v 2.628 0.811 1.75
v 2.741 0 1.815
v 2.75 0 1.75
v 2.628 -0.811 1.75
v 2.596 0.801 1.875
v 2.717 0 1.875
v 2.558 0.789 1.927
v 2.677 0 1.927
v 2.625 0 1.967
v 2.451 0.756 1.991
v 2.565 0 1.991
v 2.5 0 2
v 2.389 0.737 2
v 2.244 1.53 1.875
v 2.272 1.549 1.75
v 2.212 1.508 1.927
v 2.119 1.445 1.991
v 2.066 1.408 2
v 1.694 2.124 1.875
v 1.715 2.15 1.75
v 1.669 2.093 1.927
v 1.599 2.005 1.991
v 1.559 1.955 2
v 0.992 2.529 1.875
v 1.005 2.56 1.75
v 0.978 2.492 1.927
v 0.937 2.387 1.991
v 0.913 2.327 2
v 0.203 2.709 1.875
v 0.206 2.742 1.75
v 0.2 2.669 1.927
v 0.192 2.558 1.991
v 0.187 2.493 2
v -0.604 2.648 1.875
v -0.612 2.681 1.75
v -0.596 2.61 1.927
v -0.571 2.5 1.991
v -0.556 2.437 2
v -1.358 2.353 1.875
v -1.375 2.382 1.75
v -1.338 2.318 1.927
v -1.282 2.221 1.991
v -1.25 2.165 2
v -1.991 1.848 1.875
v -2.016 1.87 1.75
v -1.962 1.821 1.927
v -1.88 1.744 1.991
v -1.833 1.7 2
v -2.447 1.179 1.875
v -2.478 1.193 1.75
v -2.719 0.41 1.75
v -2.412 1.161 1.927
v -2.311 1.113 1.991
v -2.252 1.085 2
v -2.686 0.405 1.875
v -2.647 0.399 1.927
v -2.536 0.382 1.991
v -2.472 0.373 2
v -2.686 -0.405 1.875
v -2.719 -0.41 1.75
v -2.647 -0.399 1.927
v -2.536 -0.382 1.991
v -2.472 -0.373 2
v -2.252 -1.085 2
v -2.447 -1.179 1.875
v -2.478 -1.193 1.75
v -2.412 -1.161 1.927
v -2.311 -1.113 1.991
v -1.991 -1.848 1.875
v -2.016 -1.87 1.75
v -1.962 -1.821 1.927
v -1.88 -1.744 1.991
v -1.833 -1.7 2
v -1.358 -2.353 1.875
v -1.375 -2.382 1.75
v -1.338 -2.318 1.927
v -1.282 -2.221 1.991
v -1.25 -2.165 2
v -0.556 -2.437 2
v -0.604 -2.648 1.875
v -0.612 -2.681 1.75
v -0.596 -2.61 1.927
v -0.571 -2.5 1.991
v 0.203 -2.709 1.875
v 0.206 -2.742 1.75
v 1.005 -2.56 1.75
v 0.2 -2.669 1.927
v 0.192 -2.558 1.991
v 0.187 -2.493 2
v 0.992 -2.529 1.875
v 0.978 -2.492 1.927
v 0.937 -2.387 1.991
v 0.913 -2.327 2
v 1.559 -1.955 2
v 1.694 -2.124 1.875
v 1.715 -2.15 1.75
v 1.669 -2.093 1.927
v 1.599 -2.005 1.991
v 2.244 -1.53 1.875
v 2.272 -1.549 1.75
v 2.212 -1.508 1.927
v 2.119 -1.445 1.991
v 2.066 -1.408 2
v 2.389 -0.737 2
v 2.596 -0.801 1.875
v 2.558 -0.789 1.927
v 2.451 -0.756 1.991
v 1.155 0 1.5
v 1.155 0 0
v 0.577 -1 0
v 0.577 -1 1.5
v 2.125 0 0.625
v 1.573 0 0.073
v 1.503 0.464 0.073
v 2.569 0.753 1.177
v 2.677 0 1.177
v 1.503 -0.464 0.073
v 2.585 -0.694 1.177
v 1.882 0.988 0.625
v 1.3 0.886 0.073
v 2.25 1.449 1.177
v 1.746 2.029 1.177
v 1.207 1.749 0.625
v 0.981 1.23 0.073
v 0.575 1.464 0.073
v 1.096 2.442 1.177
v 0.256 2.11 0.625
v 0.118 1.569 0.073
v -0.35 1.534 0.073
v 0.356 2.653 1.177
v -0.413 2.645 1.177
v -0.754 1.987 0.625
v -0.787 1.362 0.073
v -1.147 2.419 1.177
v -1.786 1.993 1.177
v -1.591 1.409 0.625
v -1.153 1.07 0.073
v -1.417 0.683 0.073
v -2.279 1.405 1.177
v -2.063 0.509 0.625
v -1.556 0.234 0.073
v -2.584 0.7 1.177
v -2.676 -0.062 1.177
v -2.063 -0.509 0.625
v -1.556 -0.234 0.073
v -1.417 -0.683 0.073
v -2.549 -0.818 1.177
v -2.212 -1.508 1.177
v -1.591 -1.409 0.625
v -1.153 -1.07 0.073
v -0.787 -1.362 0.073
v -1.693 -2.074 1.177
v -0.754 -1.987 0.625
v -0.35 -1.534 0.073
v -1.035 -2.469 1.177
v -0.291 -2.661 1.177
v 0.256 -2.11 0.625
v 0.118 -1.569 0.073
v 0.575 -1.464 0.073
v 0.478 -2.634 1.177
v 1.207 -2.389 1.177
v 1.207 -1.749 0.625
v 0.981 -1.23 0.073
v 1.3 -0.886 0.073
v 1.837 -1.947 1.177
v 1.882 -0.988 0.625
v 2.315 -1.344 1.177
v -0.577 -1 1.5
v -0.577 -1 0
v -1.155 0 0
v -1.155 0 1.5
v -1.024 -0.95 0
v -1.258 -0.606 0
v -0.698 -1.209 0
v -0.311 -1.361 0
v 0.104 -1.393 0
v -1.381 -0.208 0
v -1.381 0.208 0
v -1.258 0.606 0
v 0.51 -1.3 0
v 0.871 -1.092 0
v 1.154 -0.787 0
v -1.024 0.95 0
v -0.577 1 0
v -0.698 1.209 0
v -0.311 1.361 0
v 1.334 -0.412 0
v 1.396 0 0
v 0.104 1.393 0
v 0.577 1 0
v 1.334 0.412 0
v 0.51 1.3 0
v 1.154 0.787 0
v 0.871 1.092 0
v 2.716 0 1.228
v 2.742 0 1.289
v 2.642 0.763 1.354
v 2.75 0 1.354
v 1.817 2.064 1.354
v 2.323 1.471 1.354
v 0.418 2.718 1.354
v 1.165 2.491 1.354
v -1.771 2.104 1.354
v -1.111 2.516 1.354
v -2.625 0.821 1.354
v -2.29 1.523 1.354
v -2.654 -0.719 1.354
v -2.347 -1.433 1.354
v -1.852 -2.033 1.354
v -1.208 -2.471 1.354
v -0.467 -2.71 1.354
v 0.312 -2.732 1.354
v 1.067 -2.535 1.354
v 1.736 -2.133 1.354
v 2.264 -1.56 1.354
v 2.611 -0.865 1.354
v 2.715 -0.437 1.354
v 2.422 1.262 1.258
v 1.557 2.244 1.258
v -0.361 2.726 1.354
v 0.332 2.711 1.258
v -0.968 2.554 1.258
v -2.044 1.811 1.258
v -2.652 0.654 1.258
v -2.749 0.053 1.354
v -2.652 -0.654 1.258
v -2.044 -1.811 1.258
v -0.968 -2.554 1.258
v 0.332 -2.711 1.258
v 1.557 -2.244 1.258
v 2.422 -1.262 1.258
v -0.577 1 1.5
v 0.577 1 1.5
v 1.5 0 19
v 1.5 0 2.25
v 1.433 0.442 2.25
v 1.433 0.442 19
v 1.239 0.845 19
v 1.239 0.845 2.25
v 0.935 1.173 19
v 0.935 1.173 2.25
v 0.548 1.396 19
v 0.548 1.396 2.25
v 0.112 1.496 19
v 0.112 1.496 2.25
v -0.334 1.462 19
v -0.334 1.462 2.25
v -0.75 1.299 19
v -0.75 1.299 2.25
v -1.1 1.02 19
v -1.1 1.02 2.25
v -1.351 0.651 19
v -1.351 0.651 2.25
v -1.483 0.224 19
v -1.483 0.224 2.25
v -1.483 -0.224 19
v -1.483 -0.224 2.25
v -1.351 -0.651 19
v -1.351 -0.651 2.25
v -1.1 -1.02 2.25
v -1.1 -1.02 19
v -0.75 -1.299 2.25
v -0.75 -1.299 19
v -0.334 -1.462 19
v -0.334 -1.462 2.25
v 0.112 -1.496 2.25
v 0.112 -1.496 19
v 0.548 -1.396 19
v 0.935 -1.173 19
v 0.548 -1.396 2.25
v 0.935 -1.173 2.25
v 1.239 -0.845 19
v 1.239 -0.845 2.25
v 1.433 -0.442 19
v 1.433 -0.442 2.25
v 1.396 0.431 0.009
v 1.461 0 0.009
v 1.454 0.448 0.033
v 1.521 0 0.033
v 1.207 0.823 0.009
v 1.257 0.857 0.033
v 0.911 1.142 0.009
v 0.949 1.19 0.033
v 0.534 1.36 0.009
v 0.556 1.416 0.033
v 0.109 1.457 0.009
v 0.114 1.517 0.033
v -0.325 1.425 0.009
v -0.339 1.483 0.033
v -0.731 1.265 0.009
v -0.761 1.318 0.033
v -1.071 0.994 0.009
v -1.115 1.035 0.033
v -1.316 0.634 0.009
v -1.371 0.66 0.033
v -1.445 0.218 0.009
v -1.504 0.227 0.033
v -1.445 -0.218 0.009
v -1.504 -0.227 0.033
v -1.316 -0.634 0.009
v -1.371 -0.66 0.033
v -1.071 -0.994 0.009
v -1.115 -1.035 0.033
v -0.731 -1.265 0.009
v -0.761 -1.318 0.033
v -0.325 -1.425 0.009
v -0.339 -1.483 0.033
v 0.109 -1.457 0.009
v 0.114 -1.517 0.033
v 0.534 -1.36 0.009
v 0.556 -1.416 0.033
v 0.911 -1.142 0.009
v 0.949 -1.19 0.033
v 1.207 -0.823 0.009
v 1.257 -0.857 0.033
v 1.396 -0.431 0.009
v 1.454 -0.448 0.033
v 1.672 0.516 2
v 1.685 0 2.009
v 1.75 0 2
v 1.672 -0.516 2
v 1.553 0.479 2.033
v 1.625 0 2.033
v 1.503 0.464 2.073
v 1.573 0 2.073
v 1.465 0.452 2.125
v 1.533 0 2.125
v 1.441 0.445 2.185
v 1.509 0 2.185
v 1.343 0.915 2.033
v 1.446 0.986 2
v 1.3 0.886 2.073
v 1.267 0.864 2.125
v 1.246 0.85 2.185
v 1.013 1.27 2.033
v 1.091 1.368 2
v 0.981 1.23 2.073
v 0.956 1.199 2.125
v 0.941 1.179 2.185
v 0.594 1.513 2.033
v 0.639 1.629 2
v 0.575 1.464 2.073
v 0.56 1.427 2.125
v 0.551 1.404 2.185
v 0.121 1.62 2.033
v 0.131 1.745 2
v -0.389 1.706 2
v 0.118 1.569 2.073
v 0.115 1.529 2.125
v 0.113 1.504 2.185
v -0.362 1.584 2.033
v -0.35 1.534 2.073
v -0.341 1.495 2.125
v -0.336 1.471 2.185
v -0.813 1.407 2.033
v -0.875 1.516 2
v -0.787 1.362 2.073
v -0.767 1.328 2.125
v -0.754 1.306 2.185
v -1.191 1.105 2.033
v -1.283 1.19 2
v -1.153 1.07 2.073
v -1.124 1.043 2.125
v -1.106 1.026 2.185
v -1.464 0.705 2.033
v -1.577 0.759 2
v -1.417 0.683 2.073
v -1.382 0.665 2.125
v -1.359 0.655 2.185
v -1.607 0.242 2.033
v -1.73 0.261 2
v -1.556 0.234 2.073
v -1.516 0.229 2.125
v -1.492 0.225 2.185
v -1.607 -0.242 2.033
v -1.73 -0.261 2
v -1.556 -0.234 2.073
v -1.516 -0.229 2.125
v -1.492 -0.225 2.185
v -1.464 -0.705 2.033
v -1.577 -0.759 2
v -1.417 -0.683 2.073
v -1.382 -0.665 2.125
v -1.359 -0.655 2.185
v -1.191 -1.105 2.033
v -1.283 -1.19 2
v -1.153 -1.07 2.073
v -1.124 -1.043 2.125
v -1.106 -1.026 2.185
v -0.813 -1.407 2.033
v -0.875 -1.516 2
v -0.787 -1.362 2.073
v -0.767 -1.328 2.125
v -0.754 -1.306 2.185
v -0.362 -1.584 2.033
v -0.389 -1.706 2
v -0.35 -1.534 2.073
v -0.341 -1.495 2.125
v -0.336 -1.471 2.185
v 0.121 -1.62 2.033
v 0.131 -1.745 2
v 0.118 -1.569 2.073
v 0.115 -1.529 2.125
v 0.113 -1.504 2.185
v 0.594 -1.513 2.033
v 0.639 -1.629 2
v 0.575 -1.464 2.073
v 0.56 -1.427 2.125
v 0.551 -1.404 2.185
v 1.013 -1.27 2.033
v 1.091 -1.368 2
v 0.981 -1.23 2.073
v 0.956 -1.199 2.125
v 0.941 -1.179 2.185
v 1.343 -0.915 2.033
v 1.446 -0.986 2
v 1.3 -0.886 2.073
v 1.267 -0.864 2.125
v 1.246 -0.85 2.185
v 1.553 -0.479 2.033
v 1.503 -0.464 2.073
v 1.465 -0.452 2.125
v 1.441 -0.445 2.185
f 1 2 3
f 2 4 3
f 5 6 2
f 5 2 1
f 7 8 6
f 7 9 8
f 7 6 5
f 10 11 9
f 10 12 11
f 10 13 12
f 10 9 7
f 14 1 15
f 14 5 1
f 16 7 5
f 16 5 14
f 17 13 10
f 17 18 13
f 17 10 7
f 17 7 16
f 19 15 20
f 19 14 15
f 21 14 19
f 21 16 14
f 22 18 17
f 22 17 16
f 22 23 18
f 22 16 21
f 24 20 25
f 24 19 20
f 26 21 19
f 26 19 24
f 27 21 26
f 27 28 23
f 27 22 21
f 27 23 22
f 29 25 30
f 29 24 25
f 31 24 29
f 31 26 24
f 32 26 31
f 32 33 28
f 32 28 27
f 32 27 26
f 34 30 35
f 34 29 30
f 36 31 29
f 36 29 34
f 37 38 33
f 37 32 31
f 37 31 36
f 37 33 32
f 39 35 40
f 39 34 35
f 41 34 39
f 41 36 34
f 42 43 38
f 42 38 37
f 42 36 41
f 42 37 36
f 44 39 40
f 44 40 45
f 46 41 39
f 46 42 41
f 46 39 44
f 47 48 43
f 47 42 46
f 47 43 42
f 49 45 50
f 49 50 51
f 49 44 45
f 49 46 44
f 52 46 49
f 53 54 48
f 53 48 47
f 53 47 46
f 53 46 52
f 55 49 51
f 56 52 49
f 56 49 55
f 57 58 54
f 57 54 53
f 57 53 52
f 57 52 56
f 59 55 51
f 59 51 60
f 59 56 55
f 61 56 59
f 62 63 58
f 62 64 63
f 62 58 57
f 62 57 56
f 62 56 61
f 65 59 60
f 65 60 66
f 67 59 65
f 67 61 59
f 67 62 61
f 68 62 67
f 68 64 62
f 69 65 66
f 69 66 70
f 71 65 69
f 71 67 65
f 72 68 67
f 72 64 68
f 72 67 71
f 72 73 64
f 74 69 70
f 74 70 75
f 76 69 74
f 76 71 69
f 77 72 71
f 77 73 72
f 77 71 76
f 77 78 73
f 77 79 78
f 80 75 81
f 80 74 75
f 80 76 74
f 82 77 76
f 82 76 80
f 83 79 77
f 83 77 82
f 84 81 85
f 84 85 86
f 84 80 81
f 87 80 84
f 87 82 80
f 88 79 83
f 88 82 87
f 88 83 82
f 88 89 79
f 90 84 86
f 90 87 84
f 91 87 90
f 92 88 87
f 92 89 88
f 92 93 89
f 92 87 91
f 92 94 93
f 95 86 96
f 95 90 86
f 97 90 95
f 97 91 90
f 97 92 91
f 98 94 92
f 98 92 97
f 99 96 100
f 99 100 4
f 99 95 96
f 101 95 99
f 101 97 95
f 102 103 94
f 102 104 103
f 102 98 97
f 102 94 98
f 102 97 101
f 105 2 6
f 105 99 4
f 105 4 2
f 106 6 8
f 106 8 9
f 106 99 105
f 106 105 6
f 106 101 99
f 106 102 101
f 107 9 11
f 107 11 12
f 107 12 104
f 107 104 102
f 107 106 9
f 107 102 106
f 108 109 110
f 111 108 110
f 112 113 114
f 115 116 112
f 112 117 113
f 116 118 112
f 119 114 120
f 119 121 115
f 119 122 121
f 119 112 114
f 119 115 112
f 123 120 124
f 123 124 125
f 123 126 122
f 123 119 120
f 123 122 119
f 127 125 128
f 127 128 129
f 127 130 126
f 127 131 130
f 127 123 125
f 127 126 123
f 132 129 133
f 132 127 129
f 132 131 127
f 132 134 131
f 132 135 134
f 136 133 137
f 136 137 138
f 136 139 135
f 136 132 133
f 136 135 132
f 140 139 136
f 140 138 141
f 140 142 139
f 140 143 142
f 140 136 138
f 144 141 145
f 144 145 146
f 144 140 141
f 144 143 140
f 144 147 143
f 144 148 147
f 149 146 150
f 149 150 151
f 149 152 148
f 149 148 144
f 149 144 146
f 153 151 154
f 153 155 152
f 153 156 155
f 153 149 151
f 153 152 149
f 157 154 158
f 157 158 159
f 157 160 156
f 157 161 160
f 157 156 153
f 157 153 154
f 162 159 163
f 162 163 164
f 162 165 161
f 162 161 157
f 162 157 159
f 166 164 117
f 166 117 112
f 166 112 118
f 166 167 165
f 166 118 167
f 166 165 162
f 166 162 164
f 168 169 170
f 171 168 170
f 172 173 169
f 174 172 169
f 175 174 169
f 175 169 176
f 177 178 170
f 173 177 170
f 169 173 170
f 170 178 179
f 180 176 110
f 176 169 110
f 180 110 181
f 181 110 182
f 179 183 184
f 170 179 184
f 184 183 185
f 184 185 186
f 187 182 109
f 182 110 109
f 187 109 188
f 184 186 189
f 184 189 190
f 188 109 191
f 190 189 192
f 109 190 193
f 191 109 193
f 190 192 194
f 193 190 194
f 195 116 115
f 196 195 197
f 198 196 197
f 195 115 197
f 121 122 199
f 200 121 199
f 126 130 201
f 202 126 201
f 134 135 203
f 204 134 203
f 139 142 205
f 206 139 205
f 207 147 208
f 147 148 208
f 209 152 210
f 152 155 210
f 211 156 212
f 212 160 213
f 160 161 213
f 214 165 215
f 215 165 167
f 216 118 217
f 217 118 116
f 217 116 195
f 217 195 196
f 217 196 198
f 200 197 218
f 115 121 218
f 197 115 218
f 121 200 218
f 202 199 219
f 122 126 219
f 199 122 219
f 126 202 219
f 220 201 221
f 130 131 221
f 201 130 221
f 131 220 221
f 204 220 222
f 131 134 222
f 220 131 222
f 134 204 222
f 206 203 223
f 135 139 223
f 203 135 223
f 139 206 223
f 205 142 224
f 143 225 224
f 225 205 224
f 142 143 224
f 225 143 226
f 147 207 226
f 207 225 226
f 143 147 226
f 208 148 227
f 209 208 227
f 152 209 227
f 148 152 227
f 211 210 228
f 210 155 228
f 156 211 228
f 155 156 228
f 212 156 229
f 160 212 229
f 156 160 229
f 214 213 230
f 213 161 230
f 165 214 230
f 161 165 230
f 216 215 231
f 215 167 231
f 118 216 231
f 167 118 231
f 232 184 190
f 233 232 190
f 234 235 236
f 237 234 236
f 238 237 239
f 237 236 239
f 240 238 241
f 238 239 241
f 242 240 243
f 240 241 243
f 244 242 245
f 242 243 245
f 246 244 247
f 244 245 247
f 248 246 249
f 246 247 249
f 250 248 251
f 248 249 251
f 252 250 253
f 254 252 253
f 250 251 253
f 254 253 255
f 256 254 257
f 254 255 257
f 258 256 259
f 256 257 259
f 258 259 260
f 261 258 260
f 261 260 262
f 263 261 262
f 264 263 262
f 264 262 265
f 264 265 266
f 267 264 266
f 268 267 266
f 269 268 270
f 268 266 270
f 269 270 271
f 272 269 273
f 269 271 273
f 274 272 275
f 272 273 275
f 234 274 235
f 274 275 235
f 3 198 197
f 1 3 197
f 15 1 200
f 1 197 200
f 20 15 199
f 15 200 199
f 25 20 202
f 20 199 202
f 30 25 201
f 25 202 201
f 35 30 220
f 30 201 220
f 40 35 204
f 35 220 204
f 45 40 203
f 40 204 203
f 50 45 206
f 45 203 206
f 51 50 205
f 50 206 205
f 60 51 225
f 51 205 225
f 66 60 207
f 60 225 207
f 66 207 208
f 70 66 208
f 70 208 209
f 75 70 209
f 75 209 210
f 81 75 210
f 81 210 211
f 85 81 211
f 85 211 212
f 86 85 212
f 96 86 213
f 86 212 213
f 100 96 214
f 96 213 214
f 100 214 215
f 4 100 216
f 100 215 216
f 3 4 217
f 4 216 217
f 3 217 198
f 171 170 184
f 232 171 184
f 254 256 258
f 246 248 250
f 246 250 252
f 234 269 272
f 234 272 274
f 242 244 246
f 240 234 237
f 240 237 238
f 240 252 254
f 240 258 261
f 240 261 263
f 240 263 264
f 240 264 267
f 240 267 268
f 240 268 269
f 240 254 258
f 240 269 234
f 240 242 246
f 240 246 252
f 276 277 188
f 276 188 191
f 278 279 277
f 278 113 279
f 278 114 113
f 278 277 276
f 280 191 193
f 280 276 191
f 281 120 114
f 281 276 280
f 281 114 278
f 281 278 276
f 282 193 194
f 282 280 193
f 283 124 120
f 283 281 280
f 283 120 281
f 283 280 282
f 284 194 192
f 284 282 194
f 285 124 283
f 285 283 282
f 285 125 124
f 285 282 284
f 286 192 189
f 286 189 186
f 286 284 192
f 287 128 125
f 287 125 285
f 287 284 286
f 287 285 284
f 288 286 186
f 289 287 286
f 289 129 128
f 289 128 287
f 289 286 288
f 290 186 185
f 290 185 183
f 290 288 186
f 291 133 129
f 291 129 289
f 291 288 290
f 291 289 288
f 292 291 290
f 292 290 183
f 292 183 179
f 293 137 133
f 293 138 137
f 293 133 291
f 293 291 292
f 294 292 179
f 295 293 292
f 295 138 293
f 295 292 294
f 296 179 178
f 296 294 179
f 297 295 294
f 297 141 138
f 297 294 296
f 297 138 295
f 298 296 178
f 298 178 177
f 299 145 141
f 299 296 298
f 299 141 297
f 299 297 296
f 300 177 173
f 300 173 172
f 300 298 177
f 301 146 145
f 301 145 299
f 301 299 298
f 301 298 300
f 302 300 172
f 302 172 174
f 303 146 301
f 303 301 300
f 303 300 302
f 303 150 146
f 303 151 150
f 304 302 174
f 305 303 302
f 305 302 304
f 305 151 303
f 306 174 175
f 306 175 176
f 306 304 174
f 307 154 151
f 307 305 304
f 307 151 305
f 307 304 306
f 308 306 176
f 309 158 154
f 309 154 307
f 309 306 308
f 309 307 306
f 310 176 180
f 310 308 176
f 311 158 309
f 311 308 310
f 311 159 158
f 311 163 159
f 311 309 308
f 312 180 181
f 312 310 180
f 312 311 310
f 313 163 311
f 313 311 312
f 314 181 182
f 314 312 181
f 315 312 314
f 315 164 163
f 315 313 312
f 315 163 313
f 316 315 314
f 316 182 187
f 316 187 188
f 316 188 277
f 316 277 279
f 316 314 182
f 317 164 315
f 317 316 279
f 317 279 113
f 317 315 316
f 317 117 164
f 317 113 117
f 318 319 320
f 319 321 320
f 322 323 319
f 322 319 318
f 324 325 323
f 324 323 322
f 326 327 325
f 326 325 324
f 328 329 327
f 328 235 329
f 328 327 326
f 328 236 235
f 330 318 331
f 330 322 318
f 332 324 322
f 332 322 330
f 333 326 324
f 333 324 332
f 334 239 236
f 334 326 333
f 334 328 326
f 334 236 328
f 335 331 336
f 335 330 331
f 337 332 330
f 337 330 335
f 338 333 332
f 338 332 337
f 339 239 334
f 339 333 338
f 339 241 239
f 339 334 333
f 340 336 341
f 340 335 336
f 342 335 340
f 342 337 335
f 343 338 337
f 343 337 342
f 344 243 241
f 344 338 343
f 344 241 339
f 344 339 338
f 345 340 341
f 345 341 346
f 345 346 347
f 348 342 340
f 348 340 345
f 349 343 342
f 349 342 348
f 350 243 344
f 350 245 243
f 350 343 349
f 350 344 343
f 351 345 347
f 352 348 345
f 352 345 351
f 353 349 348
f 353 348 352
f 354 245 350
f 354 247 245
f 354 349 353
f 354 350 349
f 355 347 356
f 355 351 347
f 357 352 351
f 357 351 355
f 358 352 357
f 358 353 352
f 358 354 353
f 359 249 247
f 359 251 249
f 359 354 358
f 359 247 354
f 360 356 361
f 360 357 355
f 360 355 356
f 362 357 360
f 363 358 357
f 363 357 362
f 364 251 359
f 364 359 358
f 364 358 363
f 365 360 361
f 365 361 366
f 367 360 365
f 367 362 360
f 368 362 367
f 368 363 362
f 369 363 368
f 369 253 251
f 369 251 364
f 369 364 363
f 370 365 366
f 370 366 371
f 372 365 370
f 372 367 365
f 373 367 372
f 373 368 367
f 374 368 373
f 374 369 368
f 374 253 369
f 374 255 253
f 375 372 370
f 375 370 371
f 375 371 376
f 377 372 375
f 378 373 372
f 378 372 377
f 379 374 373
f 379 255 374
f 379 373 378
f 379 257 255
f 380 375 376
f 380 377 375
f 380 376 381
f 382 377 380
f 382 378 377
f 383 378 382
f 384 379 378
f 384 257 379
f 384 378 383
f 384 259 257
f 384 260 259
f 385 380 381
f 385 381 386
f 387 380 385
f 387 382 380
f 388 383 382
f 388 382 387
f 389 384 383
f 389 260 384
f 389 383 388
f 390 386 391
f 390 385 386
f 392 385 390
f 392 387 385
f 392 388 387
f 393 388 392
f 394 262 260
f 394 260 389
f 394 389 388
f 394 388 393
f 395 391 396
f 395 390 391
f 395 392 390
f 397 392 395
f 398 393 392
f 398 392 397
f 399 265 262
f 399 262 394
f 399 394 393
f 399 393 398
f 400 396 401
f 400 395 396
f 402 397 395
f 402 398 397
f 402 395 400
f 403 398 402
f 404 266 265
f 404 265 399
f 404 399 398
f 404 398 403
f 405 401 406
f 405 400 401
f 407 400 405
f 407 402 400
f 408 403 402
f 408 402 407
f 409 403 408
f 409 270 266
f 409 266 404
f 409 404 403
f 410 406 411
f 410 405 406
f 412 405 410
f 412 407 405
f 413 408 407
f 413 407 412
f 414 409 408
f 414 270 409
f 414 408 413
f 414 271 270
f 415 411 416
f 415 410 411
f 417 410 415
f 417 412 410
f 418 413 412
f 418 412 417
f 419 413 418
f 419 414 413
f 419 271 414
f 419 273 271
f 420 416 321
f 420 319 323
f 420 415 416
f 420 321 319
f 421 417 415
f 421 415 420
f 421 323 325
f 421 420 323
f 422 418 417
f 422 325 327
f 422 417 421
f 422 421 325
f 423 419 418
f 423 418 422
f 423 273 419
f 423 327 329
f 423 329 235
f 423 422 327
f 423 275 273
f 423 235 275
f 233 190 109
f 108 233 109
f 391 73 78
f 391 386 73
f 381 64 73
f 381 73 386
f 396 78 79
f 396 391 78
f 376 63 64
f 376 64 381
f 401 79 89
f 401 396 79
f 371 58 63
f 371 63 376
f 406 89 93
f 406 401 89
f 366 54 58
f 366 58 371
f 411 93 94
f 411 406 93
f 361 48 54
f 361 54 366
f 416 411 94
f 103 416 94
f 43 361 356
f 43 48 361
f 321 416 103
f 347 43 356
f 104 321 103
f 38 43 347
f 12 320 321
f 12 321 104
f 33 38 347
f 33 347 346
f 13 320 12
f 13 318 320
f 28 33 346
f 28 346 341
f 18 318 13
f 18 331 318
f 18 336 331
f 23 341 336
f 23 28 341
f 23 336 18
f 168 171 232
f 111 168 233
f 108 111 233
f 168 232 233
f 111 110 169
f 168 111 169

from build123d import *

# Parameters (mm, degrees)
F1_R     = 2.75
F1_R_2   = 1.5
F2_DEPTH = 2
F3_START = 1.5
F3_DEPTH = 0.5
F4_START = 2
F4_DEPTH = 17
F5_SIZE2 = 1.25
F5_SIZE  = 1.25
F6_R     = 0.25


# Not quite as in the source:
# - a feature names something its author has since deleted; it is built from what else it names


with BuildPart() as f2:
    # F1 (on Top) → F2 (new body)
    with BuildSketch(Plane.XY):
        Circle(F1_R)
        Circle(F1_R_2, mode=Mode.SUBTRACT)
        Circle(F1_R_2)
        Polygon((-0.5773502692, -1), (-1.1547005384, 0), (-0.5773502692, 1), (0.5773502692, 1), (1.1547005384, 0), (0.5773502692, -1), align=None, mode=Mode.SUBTRACT)
    extrude(amount=F2_DEPTH)

    # F1 (on Top) → F3 (join)
    with BuildSketch(Plane.XY.offset(F3_START)):
        Polygon((-0.5773502692, 1), (-1.1547005384, 0), (-0.5773502692, -1), (0.5773502692, -1), (1.1547005384, 0), (0.5773502692, 1), align=None)
    extrude(amount=F3_DEPTH)

    # F1 (on Top) → F4 (join)
    with BuildSketch(Plane.XY.offset(F4_START)):
        Circle(F1_R_2)
        Polygon((-0.5773502692, -1), (-1.1547005384, 0), (-0.5773502692, 1), (0.5773502692, 1), (1.1547005384, 0), (0.5773502692, -1), align=None, mode=Mode.SUBTRACT)
        Polygon((-0.5773502692, 1), (-1.1547005384, 0), (-0.5773502692, -1), (0.5773502692, -1), (1.1547005384, 0), (0.5773502692, 1), align=None)
    extrude(amount=F4_DEPTH)

    # F5
    f5_edges = [f2.edges().sort_by_distance(p)[0] for p in [
        (-2.75, 0, 0),
    ]]
    chamfer(f5_edges, length=F5_SIZE, length2=F5_SIZE2)

    # F6
    f6_edges = [f2.edges().sort_by_distance(p)[0] for p in [
        (-2.75, 0, 2),
        (-1.5, 0, 2),
        (-1.5, 0, 0),
        (-2.75, 0, 1.25),
    ]]
    fillet(f6_edges, radius=F6_R)


solid = f2.part
